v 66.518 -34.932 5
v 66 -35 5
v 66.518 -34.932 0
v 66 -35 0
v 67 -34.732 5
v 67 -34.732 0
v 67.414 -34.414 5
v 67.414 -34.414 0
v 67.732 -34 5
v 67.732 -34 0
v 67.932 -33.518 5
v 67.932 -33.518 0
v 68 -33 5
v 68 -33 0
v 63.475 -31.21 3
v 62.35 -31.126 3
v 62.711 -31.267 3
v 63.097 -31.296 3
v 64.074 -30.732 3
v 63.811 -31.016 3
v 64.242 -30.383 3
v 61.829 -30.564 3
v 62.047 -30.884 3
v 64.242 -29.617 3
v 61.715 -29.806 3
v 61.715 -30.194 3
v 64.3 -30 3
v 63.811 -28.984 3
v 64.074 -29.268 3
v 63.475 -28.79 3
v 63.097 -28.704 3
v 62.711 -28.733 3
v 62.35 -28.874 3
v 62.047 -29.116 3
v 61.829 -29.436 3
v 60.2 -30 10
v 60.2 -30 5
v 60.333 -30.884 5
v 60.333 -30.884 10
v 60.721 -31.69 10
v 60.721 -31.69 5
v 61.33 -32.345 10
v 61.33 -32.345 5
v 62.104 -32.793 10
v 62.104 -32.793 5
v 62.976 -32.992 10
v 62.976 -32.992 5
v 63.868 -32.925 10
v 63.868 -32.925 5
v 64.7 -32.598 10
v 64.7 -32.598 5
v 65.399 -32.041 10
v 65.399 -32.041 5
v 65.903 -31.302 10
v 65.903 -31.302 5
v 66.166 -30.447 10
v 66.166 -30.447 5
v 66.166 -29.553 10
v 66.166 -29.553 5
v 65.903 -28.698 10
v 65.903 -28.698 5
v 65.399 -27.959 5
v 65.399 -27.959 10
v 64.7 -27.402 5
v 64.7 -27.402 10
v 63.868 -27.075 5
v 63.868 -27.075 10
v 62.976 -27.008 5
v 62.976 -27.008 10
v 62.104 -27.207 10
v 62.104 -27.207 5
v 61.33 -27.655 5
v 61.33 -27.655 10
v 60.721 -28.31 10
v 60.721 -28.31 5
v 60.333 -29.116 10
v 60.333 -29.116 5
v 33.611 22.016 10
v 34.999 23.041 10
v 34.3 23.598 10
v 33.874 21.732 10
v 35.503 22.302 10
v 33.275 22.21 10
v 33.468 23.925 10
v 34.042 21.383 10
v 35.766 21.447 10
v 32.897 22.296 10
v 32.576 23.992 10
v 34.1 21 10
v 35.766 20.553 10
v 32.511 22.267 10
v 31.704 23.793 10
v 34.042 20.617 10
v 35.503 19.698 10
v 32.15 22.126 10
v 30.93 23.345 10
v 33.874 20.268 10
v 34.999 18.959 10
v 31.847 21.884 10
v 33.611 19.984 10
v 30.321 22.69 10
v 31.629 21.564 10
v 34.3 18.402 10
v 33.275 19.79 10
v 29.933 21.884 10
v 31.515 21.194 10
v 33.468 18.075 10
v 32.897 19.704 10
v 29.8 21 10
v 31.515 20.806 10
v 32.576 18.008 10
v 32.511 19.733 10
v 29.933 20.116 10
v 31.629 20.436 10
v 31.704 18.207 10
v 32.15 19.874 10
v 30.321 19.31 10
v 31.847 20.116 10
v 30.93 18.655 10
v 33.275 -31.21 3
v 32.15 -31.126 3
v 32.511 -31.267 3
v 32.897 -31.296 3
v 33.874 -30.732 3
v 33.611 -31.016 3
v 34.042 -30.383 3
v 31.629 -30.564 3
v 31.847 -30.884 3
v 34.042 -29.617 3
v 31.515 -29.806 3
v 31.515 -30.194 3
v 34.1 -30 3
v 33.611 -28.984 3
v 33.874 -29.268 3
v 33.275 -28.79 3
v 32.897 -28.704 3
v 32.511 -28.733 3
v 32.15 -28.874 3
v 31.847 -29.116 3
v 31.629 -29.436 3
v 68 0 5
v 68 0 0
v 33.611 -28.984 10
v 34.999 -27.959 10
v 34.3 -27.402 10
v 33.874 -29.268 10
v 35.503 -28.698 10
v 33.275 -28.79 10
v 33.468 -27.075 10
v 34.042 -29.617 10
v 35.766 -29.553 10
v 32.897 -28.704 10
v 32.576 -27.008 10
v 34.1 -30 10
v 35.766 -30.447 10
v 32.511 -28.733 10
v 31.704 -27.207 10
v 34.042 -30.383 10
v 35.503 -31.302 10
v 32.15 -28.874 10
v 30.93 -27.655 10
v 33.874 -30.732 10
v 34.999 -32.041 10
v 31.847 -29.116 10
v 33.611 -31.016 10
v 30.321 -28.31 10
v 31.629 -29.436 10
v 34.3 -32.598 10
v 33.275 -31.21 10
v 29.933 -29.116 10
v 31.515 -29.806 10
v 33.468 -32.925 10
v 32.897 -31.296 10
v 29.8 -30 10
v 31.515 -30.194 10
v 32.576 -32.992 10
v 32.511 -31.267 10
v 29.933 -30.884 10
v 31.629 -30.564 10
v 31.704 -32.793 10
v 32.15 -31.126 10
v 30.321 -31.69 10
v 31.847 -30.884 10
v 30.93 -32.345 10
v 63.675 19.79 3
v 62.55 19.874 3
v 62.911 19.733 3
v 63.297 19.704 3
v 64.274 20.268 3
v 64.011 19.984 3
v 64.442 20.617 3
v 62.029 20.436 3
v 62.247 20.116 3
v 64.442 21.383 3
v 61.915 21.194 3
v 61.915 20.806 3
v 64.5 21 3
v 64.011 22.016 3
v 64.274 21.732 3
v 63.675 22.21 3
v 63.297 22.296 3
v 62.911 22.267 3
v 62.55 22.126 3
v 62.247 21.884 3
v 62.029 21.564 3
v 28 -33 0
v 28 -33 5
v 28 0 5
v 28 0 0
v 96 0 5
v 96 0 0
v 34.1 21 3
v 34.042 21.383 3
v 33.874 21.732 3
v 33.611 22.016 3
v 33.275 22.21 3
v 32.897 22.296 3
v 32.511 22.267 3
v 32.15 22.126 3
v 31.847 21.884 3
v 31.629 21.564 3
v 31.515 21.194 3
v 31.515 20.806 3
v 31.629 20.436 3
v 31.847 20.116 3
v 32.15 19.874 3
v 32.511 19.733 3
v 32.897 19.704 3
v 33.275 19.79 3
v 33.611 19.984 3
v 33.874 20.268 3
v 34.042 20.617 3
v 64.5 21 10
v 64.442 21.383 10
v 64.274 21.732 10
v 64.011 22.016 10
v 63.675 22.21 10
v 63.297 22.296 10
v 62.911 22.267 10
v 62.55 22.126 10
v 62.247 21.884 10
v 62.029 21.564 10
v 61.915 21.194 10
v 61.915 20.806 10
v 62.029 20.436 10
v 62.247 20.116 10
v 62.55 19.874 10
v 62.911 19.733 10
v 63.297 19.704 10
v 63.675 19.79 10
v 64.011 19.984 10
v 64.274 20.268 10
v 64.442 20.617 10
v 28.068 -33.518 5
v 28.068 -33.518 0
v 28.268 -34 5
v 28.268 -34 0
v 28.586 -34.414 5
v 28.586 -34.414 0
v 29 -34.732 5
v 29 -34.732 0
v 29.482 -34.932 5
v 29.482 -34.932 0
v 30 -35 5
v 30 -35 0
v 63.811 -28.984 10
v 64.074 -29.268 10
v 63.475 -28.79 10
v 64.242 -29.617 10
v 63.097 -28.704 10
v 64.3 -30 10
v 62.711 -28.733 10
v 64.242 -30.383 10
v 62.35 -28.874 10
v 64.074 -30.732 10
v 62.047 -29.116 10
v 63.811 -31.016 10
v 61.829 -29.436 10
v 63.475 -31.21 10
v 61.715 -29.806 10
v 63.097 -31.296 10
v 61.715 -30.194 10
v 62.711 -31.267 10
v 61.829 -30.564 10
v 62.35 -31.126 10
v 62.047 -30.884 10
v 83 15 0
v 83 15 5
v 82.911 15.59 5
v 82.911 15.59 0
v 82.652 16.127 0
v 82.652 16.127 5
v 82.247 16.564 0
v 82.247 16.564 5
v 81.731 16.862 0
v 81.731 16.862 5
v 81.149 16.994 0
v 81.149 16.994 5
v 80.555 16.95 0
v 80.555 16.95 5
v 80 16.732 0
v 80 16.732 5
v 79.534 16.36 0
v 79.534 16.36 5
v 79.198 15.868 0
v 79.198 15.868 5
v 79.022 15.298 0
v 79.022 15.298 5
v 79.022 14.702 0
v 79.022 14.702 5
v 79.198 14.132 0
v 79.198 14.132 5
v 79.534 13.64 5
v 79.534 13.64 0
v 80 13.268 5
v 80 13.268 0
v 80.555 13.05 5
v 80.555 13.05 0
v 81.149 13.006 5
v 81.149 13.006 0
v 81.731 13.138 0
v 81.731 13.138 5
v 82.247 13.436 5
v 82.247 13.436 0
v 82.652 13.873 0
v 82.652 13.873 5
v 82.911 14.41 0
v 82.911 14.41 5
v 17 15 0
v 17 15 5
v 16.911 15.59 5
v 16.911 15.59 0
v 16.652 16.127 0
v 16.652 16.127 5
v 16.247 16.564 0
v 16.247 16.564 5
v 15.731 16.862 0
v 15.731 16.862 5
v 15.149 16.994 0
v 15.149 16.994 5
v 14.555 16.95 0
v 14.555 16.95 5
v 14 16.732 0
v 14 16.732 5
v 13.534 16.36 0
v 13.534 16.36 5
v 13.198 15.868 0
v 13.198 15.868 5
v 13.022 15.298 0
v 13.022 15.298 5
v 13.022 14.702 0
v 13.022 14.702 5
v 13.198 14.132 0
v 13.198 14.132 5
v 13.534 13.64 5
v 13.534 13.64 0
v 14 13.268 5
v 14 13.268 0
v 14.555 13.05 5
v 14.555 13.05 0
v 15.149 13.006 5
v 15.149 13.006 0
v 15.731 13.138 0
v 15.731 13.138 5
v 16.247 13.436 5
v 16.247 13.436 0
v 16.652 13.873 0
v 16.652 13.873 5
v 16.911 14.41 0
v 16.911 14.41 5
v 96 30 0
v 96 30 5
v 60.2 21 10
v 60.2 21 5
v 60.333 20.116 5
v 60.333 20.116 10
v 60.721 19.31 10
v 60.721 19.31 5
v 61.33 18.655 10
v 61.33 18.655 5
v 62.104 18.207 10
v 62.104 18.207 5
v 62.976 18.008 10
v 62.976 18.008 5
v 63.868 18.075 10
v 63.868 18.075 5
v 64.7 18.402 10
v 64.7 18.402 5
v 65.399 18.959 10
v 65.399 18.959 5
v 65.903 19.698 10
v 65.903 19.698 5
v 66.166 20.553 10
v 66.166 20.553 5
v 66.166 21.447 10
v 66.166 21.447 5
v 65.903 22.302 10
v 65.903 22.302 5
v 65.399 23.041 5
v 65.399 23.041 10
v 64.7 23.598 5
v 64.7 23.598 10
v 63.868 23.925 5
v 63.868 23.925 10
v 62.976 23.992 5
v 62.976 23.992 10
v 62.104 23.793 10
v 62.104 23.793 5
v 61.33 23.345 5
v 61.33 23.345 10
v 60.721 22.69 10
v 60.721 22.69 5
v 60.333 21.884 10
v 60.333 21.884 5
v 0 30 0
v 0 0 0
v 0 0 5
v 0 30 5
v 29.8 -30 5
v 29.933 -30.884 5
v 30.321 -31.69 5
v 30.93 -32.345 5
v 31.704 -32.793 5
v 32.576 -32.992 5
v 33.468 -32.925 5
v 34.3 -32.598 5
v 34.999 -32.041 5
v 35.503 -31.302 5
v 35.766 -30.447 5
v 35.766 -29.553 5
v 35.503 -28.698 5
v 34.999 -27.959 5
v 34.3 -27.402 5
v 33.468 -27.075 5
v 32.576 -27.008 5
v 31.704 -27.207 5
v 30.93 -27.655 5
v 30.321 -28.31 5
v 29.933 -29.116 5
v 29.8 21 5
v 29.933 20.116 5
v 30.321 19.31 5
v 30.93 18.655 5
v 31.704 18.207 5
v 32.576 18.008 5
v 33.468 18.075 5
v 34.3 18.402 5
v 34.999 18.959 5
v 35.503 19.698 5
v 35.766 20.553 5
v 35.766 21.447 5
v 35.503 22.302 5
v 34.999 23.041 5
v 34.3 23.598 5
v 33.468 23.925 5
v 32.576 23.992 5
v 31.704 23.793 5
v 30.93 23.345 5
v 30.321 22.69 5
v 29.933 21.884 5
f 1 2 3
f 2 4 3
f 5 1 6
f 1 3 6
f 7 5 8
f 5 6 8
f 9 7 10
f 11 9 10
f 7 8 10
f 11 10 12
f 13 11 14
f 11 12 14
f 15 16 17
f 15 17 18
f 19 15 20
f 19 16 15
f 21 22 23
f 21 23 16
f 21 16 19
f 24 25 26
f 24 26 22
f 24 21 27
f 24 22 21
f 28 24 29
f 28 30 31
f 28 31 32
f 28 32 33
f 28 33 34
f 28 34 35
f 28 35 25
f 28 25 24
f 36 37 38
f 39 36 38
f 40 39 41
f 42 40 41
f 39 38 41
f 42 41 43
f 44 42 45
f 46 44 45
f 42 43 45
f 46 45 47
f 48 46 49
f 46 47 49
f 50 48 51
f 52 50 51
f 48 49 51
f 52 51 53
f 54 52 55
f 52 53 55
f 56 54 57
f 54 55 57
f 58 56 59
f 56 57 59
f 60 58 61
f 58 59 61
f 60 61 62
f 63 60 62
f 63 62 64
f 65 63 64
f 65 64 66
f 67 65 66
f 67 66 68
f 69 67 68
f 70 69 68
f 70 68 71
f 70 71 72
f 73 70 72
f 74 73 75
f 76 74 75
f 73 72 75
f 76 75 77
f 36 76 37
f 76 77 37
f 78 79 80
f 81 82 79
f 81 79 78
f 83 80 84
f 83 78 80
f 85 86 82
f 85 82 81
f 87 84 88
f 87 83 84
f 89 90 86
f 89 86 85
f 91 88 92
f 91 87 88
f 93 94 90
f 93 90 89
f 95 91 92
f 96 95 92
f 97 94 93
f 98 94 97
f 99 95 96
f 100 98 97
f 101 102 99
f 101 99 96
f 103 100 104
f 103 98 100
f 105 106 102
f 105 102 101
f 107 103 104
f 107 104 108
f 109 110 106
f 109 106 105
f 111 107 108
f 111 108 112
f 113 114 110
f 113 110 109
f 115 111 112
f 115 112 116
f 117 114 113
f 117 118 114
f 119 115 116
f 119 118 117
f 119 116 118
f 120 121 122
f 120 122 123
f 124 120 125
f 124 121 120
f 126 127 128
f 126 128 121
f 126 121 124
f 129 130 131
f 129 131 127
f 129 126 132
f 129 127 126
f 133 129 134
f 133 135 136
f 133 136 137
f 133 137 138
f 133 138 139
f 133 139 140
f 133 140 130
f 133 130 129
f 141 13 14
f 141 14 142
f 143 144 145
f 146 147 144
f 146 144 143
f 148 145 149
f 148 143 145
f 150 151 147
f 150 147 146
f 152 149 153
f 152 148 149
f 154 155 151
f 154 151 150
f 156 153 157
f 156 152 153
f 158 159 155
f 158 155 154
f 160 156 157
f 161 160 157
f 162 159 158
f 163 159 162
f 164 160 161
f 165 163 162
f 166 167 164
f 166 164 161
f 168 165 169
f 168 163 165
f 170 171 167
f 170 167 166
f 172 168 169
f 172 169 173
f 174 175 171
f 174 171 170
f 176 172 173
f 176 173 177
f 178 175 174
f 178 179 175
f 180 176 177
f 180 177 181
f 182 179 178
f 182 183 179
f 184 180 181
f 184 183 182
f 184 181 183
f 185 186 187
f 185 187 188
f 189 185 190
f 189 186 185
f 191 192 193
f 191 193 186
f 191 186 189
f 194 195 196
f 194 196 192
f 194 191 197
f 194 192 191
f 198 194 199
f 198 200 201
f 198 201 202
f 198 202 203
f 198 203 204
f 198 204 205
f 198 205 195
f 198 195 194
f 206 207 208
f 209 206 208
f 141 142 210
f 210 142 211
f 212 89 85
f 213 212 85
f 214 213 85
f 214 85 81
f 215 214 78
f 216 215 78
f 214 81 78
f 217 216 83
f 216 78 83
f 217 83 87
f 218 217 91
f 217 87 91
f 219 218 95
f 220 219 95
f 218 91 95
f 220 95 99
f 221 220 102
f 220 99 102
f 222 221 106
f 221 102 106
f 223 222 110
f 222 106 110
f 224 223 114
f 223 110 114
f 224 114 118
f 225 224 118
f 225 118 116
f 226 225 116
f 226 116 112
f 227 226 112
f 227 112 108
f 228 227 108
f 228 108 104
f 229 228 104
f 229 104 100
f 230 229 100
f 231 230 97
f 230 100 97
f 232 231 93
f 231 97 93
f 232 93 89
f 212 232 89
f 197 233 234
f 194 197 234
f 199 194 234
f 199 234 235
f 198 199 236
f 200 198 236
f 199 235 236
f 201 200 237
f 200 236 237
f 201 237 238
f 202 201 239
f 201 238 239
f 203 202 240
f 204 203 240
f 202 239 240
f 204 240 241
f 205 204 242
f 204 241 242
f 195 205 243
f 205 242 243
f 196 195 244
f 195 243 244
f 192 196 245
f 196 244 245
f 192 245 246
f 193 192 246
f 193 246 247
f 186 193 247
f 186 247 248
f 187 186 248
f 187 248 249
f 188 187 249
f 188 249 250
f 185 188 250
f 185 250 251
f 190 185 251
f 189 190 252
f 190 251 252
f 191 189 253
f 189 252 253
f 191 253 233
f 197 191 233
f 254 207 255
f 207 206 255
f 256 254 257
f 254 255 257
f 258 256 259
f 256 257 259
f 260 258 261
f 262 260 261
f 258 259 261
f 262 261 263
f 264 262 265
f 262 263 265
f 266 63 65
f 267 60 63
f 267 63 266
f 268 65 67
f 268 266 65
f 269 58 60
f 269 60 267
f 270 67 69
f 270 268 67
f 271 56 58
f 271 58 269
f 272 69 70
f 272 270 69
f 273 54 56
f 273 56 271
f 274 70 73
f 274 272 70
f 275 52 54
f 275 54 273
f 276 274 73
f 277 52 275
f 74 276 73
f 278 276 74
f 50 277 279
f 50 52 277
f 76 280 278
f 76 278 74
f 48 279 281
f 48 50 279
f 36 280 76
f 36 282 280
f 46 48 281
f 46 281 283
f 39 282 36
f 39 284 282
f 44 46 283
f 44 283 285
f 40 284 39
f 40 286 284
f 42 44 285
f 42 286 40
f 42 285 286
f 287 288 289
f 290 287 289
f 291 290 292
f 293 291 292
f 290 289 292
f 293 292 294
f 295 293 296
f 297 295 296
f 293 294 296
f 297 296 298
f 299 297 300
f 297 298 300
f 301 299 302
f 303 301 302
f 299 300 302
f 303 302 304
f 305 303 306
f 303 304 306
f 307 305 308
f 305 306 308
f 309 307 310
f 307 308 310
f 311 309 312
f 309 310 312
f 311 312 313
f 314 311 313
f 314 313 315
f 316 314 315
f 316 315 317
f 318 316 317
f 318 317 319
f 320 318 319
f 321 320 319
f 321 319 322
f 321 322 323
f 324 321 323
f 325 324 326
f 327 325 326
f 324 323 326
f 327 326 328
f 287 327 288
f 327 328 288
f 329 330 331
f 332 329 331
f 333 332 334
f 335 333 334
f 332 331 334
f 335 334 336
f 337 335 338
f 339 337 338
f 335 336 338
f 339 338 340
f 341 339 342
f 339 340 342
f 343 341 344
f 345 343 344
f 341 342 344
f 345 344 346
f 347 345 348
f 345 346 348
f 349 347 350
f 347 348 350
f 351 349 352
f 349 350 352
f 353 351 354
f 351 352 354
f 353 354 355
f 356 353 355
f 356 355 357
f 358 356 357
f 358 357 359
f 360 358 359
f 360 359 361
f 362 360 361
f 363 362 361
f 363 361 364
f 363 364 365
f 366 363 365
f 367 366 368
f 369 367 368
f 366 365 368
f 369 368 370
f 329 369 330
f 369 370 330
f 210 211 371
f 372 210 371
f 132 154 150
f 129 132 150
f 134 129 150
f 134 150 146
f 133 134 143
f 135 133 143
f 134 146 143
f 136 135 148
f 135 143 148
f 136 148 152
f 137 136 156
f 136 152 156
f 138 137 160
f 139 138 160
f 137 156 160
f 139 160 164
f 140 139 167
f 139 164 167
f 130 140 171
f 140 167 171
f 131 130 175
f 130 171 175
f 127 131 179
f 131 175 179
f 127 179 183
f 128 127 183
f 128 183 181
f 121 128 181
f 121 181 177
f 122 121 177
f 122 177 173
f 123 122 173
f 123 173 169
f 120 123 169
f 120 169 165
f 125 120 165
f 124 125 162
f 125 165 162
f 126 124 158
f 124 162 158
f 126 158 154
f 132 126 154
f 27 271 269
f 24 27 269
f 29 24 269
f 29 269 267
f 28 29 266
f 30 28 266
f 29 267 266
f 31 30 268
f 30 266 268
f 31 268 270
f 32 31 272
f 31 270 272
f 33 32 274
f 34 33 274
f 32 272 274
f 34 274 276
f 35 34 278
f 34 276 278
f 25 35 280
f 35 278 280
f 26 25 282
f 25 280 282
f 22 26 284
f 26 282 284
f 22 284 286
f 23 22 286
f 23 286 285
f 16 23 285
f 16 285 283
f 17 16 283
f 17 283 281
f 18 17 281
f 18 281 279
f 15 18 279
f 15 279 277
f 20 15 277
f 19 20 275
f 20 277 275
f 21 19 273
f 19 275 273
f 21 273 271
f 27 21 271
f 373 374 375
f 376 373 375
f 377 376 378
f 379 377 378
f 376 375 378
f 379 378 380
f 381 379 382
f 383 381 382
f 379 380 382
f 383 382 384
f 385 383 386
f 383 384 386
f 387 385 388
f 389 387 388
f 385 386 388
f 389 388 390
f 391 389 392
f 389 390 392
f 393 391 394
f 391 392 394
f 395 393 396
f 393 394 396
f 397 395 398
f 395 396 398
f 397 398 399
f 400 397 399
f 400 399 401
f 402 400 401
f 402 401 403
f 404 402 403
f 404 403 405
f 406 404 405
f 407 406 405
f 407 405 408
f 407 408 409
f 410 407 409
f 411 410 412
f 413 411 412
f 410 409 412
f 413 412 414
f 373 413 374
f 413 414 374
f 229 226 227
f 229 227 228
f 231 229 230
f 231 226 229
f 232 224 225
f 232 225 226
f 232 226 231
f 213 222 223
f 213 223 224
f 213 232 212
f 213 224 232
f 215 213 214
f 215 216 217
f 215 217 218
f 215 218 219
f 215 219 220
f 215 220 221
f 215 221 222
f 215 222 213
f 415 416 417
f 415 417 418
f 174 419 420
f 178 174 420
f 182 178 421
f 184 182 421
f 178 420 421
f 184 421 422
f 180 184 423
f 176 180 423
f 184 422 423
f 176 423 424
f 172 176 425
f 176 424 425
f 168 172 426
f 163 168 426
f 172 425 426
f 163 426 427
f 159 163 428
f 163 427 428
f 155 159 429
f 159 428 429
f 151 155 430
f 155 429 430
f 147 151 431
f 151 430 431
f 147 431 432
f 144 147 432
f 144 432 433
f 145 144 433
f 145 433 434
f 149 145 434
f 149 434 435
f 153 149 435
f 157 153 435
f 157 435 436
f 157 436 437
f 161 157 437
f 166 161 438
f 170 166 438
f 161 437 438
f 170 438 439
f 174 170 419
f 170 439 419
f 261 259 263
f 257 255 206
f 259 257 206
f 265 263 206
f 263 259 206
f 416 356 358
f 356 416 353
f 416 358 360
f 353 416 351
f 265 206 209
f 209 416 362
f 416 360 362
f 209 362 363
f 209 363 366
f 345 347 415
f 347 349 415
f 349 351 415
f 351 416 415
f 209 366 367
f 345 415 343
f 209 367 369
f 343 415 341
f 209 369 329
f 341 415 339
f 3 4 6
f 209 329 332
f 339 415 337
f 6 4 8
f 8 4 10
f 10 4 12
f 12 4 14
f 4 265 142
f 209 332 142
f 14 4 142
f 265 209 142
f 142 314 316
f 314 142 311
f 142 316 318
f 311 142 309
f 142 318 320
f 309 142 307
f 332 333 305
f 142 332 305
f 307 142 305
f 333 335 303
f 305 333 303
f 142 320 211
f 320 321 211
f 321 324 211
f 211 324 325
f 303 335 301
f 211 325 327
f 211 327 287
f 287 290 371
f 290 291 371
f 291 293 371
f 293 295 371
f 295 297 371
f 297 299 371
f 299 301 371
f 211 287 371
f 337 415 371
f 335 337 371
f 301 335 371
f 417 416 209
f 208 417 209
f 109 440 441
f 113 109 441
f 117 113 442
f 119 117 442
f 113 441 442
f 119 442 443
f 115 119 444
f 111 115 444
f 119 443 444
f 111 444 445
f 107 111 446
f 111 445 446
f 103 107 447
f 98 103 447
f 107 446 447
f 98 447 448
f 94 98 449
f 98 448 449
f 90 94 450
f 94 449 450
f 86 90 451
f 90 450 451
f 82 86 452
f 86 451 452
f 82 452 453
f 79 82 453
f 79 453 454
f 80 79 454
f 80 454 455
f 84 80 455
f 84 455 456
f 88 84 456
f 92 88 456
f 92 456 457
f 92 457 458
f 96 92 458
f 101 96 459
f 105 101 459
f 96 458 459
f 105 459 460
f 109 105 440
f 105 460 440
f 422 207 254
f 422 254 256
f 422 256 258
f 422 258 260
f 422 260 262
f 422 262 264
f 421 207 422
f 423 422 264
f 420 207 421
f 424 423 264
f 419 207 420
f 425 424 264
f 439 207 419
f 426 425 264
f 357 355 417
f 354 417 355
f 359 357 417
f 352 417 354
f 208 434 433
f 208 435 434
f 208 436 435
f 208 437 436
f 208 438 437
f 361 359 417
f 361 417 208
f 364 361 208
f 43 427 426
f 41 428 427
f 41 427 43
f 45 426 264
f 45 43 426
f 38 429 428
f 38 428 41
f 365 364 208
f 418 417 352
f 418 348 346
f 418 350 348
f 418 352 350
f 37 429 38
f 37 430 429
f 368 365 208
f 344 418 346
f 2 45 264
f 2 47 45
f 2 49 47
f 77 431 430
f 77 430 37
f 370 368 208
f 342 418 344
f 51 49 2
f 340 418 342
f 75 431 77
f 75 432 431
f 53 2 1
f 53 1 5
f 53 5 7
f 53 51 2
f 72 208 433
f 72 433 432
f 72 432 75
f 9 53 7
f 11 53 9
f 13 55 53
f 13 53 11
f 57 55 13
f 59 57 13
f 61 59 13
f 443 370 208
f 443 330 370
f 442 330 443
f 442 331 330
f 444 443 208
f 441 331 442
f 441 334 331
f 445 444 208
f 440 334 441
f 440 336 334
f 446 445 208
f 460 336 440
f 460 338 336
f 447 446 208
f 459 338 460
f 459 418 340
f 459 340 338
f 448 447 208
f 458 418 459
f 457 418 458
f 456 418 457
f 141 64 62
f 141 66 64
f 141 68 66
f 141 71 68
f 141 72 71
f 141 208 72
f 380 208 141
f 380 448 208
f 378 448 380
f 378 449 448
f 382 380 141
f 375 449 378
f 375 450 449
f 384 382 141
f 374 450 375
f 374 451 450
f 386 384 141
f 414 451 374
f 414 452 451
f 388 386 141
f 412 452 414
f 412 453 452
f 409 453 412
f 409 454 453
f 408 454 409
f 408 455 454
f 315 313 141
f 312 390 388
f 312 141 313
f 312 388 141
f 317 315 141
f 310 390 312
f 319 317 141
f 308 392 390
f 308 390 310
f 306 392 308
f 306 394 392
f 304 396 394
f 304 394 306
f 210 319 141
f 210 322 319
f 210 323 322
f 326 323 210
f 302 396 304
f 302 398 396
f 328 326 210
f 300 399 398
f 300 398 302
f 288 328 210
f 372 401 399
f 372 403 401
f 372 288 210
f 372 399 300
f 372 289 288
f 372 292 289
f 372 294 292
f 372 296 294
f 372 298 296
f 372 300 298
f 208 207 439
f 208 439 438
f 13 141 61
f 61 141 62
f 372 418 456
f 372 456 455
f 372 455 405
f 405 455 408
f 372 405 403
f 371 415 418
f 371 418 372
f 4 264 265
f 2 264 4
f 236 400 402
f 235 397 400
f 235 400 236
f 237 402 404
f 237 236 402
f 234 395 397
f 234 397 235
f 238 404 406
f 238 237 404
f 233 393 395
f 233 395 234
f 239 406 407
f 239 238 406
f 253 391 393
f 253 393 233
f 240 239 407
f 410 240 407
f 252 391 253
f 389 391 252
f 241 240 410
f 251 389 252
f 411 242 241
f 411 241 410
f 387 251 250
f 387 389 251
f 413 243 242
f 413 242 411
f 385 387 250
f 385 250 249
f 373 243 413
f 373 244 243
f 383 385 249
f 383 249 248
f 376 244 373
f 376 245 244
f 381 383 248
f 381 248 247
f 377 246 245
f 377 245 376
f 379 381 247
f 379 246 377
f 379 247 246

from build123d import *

# Parameters (mm, degrees)
SZKIC1_W                    = 96
SZKIC1_H                    = 30
DODANIE_WYCI_GNI_CIE1_DEPTH = 5
SZKIC2_W                    = 40
SZKIC2_H                    = 35
DODANIE_WYCI_GNI_CIE2_DEPTH = 5
SZKIC3_R                    = 2
WYTNIJ_WYCI_GNI_CIE1_DEPTH  = 5
SZKIC4_R                    = 3
DODANIE_WYCI_GNI_CIE3_DEPTH = 5
SZKIC5_R                    = 1.3
WYTNIJ_WYCI_GNI_CIE2_DEPTH  = 7
ZAOKR_GLENIE1_R             = 2


with BuildPart() as part:
    # Szkic1 → Dodanie-wyciągnięcie1 (new body)
    with BuildSketch(Plane.XY):
        with Locations((48, 15)):
            Rectangle(SZKIC1_W, SZKIC1_H)
    extrude(amount=DODANIE_WYCI_GNI_CIE1_DEPTH)

    # Szkic2 → Dodanie-wyciągnięcie2 (add)
    with BuildSketch(Plane.XY.offset(5)):
        with Locations((48, -17.5)):
            Rectangle(SZKIC2_W, SZKIC2_H)
    extrude(amount=-DODANIE_WYCI_GNI_CIE2_DEPTH)

    # Szkic3 → Wytnij-wyciągnięcie1 (cut)
    with BuildSketch(Plane.XY.offset(5)):
        with Locations((15, 15)):
            Circle(SZKIC3_R)
        with Locations((81, 15)):
            Circle(SZKIC3_R)
    extrude(amount=-WYTNIJ_WYCI_GNI_CIE1_DEPTH, mode=Mode.SUBTRACT)

    # Szkic4 → Dodanie-wyciągnięcie3 (add)
    with BuildSketch(Plane.XY.offset(5)):
        with Locations(Location((32.8, -30, 0), (0, 0, 180))):
            Circle(SZKIC4_R)
        with Locations(Location((63.2, -30, 0), (0, 0, 180))):
            Circle(SZKIC4_R)
        with Locations(Location((63.2, 21, 0), (0, 0, 180))):
            Circle(SZKIC4_R)
        with Locations(Location((32.8, 21, 0), (0, 0, 180))):
            Circle(SZKIC4_R)
    extrude(amount=DODANIE_WYCI_GNI_CIE3_DEPTH)

    # Szkic5 → Wytnij-wyciągnięcie2 (cut)
    with BuildSketch(Plane.XY.offset(10)):
        with Locations((32.8, 21)):
            Circle(SZKIC5_R)
        with Locations((63.2, 21)):
            Circle(SZKIC5_R)
        with Locations((32.8, -30)):
            Circle(SZKIC5_R)
        with Locations((63, -30)):
            Circle(SZKIC5_R)
    extrude(amount=-WYTNIJ_WYCI_GNI_CIE2_DEPTH, mode=Mode.SUBTRACT)

    # Zaokrąglenie1
    zaokr_glenie1_edges = [part.edges().sort_by_distance(p)[0] for p in [
        (28, -35, 2.5),
        (68, -35, 2.5),
    ]]
    fillet(zaokr_glenie1_edges, radius=ZAOKR_GLENIE1_R)


solid = part.part
